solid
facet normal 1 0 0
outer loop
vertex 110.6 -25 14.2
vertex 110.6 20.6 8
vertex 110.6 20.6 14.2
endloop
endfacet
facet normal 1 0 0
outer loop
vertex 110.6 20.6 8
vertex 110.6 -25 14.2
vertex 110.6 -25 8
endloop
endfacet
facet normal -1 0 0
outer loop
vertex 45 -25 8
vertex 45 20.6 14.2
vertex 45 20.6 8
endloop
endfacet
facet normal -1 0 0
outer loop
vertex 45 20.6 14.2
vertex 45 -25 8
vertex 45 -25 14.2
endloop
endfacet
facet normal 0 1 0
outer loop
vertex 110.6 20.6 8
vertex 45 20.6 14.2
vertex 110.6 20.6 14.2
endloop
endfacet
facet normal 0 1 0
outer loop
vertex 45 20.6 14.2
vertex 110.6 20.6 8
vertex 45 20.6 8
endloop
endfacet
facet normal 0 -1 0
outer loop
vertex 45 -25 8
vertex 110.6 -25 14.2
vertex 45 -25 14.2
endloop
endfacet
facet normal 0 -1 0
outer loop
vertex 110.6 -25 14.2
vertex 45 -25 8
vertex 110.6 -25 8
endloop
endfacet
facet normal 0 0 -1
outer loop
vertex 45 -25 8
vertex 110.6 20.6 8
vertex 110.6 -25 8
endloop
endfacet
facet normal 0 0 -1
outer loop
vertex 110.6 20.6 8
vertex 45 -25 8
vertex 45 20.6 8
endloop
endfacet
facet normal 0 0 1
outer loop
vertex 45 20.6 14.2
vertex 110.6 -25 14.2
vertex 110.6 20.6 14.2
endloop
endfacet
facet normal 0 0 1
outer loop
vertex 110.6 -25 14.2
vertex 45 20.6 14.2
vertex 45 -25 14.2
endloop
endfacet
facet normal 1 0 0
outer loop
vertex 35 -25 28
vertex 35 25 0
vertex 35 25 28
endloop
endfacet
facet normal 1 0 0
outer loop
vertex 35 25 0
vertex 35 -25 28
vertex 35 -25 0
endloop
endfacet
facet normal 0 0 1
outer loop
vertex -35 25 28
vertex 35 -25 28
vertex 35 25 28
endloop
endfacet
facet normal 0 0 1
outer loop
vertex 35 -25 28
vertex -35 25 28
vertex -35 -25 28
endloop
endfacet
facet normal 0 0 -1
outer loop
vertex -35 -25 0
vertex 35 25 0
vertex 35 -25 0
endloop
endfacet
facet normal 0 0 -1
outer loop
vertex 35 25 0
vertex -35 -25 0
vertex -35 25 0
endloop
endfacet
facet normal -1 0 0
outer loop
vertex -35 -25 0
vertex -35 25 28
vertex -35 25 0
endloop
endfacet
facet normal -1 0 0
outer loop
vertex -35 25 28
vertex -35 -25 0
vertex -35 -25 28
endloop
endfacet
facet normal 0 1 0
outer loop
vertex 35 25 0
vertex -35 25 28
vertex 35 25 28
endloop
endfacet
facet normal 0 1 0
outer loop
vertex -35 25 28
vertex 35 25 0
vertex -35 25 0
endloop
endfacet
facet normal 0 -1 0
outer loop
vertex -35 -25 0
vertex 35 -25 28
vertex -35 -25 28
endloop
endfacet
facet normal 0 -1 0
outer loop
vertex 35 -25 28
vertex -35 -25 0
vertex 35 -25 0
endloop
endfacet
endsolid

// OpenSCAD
// Two-part enclosure for small electronics board
// Print orientation: both parts on bed, lid on +X side of box

// ---- Box ----
box_x = 70;      // outer length (X)
box_y = 50;      // outer width (Y)
box_z = 30;      // outer height (Z)
wall = 2;        // wall thickness
floor = 2;       // floor thickness

// ---- Lid ----
lip_w = 65.6;    // lip outer length (X)
lip_d = 45.6;    // lip outer width (Y)
lip_h = 4;       // lip height (above plate)
plate_t = 2;     // plate thickness
eps = 0.2;       // clearance between lip and box opening

// Derived
lip_r = wall + eps;  // lip wall thickness (wall + clearance)

$fn = 64;

// Box (open top)
module box() {
    translate([-box_x/2, -box_y/2, 0])
        cube([box_x, box_y, box_z - floor]);
}

// Lid (plate + lip, printed upside down)
module lid() {
    translate([box_x/2 + 10, -box_y/2, 0]) {
        // Plate
        cube([lip_w, lip_d, plate_t]);
        // Lip: wall on bottom face, extended top face
        translate([0, 0, plate_t - lip_h])
            cube([lip_w, lip_d, lip_h]);
        // Side walls of lip
        translate([0, 0, plate_t])
            cube([lip_w, lip_d, lip_r]);
    }
}

union() {
    box();
    translate([0, 0, 10])
        lid();
}
